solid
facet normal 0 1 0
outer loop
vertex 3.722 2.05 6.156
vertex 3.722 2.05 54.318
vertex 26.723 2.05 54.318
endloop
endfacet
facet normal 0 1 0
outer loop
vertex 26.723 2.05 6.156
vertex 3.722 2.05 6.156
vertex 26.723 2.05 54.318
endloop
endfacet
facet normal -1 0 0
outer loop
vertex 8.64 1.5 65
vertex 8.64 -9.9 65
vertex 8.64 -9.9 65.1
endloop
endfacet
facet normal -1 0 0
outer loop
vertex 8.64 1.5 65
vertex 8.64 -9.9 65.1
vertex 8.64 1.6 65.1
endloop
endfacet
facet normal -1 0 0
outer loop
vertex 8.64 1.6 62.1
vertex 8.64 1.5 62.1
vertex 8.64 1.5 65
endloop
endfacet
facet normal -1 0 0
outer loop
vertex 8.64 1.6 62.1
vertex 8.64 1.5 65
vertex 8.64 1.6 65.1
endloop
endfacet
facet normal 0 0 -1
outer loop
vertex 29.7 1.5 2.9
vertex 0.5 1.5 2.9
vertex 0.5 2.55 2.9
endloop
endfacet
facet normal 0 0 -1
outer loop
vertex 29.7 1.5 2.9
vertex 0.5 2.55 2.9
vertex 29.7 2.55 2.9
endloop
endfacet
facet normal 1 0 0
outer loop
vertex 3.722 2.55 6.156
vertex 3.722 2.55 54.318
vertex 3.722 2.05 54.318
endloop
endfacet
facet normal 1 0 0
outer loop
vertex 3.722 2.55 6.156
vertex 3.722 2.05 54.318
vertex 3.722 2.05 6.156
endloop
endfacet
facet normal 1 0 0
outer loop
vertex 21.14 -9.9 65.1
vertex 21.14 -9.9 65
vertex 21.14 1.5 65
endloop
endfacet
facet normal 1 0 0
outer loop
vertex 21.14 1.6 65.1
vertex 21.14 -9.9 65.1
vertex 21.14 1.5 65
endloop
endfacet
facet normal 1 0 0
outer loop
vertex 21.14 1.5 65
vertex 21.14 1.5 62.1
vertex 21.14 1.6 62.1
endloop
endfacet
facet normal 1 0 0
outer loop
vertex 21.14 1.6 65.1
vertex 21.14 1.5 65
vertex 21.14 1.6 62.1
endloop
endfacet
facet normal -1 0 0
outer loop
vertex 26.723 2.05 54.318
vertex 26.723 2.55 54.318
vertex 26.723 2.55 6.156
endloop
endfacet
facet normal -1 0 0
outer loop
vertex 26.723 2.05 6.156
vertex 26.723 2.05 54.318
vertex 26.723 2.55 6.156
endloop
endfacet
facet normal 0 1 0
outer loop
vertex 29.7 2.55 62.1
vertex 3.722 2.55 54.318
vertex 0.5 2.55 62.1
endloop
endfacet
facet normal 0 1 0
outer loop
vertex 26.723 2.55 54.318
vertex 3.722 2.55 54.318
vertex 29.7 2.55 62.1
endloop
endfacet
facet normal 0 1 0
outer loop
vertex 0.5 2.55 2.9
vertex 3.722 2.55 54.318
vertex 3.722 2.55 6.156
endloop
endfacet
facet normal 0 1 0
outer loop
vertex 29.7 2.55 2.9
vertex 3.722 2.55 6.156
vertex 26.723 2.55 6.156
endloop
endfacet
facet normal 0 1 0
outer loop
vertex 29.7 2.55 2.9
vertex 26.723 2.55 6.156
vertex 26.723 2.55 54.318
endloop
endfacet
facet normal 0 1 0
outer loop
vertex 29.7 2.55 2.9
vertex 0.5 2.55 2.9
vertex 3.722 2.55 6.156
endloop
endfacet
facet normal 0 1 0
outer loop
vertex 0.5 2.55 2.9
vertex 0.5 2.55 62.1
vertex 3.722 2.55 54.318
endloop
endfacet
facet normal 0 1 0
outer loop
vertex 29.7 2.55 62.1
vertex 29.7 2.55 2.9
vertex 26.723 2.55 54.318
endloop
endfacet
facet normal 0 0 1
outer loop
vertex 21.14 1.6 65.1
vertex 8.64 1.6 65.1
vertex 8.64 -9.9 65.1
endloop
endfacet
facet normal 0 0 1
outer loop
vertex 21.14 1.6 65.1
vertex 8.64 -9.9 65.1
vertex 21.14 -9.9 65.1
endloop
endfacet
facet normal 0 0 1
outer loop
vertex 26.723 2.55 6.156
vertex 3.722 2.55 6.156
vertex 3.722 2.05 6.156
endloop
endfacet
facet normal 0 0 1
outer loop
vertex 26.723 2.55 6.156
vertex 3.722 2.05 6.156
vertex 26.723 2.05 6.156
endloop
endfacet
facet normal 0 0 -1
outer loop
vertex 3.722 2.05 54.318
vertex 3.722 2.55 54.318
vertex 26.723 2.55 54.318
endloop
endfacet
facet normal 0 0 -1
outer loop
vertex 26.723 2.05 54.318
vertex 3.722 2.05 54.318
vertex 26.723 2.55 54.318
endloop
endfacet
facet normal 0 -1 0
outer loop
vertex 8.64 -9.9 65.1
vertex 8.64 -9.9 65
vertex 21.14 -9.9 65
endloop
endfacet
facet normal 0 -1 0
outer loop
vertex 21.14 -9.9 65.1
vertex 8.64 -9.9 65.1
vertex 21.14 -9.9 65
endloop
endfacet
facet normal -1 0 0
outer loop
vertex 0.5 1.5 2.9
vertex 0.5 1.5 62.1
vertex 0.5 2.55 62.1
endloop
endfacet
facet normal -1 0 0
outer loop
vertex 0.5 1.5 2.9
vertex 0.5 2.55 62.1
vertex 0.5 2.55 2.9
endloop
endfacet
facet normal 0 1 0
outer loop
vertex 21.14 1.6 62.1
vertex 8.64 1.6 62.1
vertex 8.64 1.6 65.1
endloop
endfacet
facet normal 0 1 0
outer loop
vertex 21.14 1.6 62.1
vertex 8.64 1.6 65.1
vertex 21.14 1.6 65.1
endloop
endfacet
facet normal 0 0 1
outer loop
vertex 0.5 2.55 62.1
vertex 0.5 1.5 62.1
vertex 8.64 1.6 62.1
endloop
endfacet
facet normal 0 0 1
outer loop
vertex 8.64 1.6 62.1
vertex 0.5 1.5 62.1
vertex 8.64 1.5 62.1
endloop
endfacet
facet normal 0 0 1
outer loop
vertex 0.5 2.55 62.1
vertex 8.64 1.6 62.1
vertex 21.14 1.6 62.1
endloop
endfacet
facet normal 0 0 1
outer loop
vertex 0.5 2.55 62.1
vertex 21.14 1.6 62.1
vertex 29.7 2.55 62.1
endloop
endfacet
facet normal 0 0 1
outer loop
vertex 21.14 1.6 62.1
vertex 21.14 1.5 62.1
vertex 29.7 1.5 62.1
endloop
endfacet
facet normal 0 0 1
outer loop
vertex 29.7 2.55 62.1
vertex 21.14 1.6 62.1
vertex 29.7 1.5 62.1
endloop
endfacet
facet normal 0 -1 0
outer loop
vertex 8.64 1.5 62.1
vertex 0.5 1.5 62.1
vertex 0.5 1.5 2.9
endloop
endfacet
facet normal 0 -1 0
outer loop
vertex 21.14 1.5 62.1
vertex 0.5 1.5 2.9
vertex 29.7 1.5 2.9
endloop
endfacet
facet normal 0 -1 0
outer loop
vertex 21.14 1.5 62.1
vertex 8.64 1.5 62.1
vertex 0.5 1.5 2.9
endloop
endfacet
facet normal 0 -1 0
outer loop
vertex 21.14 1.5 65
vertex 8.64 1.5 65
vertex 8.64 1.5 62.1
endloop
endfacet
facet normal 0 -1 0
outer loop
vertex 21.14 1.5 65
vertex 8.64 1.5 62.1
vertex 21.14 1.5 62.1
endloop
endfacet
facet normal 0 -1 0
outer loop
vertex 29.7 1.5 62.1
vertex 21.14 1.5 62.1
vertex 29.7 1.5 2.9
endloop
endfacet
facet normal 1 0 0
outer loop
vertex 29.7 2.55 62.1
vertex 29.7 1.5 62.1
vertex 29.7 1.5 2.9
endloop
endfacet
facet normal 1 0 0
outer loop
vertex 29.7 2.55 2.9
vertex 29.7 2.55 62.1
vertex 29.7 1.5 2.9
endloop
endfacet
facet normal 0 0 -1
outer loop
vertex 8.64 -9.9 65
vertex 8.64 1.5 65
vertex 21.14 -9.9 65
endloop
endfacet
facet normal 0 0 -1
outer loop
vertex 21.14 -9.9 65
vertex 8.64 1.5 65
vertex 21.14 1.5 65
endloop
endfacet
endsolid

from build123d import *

# Parameters (mm, degrees)
BOSS_EXTRUDE1_DEPTH = 1.5
SKETCH2_W           = 29.2
SKETCH2_H           = 59.2
BOSS_EXTRUDE2_DEPTH = 1.05
SKETCH3_W           = 12.5
SKETCH3_H           = 14.3
BOSS_EXTRUDE3_DEPTH = 0.1
SKETCH4_W           = 12.5
SKETCH4_H           = 3.5
BOSS_EXTRUDE4_DEPTH = 0.2
SKETCH5_W           = 12.5
SKETCH5_H           = 11.4
BOSS_EXTRUDE5_DEPTH = 0.1
SKETCH6_W           = 12.5
SKETCH6_H           = 0.3
CUT_EXTRUDE1_DEPTH  = 11.3
CUT_EXTRUDE2_DEPTH  = 1.5
SKETCH10_W          = 23.000919901
SKETCH10_H          = 48.161967413
CUT_EXTRUDE3_DEPTH  = 0.5


with BuildPart() as part:
    # Sketch1 → Boss-Extrude1 (new body)
    with BuildSketch(Plane(origin=(0, 0, 0), x_dir=(1, 0, 0), z_dir=(0, 1, 0))):
        with BuildLine():
            Line((3.25, 0), (26.95, 0))
            ThreePointArc((26.95, 0), (29.248097039, -0.951902961), (30.2, -3.25))
            Line((30.2, -3.25), (30.2, -61.75))
            ThreePointArc((30.2, -61.75), (29.248097039, -64.048097039), (26.95, -65))
            Line((26.95, -65), (3.25, -65))
            ThreePointArc((3.25, -65), (0.951902961, -64.048097039), (0, -61.75))
            Line((0, -61.75), (0, -3.25))
            ThreePointArc((0, -3.25), (0.951902961, -0.951902961), (3.25, 0))
        make_face()
    extrude(amount=BOSS_EXTRUDE1_DEPTH)

    # Sketch2 → Boss-Extrude2 (add)
    with BuildSketch(Plane(origin=(0, 1.5, 0), x_dir=(1, 0, 0), z_dir=(0, 1, 0))):
        with Locations((15.1, -32.5)):
            Rectangle(SKETCH2_W, SKETCH2_H)
    extrude(amount=BOSS_EXTRUDE2_DEPTH)

    # Sketch3 → Boss-Extrude3 (add)
    with BuildSketch(Plane(origin=(0, 1.5, 0), x_dir=(1, 0, 0), z_dir=(0, 1, 0))):
        with Locations((14.89, -69.25)):
            Rectangle(SKETCH3_W, SKETCH3_H)
    extrude(amount=BOSS_EXTRUDE3_DEPTH)

    # Sketch4 → Boss-Extrude4 (add)
    with BuildSketch(Plane(origin=(0, 1.6, 0), x_dir=(1, 0, 0), z_dir=(0, 1, 0))):
        with Locations((14.89, -74.65)):
            Rectangle(SKETCH4_W, SKETCH4_H)
    extrude(amount=BOSS_EXTRUDE4_DEPTH)

    # Sketch5 → Boss-Extrude5 (add)
    with BuildSketch(Plane.XY.offset(65)):
        with Locations((14.89, -4.2)):
            Rectangle(SKETCH5_W, SKETCH5_H)
    extrude(amount=BOSS_EXTRUDE5_DEPTH)

    # Sketch6 → Cut-Extrude1 (cut)
    with BuildSketch(Plane.XY.offset(76.4)):
        with Locations((14.89, 1.65)):
            Rectangle(SKETCH6_W, SKETCH6_H)
    extrude(amount=-CUT_EXTRUDE1_DEPTH, mode=Mode.SUBTRACT)

    # Sketch8 → Cut-Extrude2 (cut)
    with BuildSketch(Plane.XZ):
        with BuildLine():
            Line((21.14, 65), (8.64, 65))
            Line((8.64, 65), (3.25, 65))
            ThreePointArc((3.25, 65), (0.951902961, 64.048097039), (0, 61.75))
            Line((0, 61.75), (0, 3.25))
            ThreePointArc((0, 3.25), (0.951902961, 0.951902961), (3.25, 0))
            Line((3.25, 0), (26.95, 0))
            ThreePointArc((26.95, 0), (29.248097039, 0.951902961), (30.2, 3.25))
            Line((30.2, 3.25), (30.2, 61.75))
            ThreePointArc((30.2, 61.75), (29.248097039, 64.048097039), (26.95, 65))
            Line((26.95, 65), (21.14, 65))
        make_face()
    extrude(amount=-CUT_EXTRUDE2_DEPTH, mode=Mode.SUBTRACT)

    # Sketch10 → Cut-Extrude3 (cut)
    with BuildSketch(Plane(origin=(0, 2.55, 0), x_dir=(1, 0, 0), z_dir=(0, 1, 0))):
        with Locations((15.222162275, -30.236639689)):
            Rectangle(SKETCH10_W, SKETCH10_H)
    extrude(amount=-CUT_EXTRUDE3_DEPTH, mode=Mode.SUBTRACT)


solid = part.part
